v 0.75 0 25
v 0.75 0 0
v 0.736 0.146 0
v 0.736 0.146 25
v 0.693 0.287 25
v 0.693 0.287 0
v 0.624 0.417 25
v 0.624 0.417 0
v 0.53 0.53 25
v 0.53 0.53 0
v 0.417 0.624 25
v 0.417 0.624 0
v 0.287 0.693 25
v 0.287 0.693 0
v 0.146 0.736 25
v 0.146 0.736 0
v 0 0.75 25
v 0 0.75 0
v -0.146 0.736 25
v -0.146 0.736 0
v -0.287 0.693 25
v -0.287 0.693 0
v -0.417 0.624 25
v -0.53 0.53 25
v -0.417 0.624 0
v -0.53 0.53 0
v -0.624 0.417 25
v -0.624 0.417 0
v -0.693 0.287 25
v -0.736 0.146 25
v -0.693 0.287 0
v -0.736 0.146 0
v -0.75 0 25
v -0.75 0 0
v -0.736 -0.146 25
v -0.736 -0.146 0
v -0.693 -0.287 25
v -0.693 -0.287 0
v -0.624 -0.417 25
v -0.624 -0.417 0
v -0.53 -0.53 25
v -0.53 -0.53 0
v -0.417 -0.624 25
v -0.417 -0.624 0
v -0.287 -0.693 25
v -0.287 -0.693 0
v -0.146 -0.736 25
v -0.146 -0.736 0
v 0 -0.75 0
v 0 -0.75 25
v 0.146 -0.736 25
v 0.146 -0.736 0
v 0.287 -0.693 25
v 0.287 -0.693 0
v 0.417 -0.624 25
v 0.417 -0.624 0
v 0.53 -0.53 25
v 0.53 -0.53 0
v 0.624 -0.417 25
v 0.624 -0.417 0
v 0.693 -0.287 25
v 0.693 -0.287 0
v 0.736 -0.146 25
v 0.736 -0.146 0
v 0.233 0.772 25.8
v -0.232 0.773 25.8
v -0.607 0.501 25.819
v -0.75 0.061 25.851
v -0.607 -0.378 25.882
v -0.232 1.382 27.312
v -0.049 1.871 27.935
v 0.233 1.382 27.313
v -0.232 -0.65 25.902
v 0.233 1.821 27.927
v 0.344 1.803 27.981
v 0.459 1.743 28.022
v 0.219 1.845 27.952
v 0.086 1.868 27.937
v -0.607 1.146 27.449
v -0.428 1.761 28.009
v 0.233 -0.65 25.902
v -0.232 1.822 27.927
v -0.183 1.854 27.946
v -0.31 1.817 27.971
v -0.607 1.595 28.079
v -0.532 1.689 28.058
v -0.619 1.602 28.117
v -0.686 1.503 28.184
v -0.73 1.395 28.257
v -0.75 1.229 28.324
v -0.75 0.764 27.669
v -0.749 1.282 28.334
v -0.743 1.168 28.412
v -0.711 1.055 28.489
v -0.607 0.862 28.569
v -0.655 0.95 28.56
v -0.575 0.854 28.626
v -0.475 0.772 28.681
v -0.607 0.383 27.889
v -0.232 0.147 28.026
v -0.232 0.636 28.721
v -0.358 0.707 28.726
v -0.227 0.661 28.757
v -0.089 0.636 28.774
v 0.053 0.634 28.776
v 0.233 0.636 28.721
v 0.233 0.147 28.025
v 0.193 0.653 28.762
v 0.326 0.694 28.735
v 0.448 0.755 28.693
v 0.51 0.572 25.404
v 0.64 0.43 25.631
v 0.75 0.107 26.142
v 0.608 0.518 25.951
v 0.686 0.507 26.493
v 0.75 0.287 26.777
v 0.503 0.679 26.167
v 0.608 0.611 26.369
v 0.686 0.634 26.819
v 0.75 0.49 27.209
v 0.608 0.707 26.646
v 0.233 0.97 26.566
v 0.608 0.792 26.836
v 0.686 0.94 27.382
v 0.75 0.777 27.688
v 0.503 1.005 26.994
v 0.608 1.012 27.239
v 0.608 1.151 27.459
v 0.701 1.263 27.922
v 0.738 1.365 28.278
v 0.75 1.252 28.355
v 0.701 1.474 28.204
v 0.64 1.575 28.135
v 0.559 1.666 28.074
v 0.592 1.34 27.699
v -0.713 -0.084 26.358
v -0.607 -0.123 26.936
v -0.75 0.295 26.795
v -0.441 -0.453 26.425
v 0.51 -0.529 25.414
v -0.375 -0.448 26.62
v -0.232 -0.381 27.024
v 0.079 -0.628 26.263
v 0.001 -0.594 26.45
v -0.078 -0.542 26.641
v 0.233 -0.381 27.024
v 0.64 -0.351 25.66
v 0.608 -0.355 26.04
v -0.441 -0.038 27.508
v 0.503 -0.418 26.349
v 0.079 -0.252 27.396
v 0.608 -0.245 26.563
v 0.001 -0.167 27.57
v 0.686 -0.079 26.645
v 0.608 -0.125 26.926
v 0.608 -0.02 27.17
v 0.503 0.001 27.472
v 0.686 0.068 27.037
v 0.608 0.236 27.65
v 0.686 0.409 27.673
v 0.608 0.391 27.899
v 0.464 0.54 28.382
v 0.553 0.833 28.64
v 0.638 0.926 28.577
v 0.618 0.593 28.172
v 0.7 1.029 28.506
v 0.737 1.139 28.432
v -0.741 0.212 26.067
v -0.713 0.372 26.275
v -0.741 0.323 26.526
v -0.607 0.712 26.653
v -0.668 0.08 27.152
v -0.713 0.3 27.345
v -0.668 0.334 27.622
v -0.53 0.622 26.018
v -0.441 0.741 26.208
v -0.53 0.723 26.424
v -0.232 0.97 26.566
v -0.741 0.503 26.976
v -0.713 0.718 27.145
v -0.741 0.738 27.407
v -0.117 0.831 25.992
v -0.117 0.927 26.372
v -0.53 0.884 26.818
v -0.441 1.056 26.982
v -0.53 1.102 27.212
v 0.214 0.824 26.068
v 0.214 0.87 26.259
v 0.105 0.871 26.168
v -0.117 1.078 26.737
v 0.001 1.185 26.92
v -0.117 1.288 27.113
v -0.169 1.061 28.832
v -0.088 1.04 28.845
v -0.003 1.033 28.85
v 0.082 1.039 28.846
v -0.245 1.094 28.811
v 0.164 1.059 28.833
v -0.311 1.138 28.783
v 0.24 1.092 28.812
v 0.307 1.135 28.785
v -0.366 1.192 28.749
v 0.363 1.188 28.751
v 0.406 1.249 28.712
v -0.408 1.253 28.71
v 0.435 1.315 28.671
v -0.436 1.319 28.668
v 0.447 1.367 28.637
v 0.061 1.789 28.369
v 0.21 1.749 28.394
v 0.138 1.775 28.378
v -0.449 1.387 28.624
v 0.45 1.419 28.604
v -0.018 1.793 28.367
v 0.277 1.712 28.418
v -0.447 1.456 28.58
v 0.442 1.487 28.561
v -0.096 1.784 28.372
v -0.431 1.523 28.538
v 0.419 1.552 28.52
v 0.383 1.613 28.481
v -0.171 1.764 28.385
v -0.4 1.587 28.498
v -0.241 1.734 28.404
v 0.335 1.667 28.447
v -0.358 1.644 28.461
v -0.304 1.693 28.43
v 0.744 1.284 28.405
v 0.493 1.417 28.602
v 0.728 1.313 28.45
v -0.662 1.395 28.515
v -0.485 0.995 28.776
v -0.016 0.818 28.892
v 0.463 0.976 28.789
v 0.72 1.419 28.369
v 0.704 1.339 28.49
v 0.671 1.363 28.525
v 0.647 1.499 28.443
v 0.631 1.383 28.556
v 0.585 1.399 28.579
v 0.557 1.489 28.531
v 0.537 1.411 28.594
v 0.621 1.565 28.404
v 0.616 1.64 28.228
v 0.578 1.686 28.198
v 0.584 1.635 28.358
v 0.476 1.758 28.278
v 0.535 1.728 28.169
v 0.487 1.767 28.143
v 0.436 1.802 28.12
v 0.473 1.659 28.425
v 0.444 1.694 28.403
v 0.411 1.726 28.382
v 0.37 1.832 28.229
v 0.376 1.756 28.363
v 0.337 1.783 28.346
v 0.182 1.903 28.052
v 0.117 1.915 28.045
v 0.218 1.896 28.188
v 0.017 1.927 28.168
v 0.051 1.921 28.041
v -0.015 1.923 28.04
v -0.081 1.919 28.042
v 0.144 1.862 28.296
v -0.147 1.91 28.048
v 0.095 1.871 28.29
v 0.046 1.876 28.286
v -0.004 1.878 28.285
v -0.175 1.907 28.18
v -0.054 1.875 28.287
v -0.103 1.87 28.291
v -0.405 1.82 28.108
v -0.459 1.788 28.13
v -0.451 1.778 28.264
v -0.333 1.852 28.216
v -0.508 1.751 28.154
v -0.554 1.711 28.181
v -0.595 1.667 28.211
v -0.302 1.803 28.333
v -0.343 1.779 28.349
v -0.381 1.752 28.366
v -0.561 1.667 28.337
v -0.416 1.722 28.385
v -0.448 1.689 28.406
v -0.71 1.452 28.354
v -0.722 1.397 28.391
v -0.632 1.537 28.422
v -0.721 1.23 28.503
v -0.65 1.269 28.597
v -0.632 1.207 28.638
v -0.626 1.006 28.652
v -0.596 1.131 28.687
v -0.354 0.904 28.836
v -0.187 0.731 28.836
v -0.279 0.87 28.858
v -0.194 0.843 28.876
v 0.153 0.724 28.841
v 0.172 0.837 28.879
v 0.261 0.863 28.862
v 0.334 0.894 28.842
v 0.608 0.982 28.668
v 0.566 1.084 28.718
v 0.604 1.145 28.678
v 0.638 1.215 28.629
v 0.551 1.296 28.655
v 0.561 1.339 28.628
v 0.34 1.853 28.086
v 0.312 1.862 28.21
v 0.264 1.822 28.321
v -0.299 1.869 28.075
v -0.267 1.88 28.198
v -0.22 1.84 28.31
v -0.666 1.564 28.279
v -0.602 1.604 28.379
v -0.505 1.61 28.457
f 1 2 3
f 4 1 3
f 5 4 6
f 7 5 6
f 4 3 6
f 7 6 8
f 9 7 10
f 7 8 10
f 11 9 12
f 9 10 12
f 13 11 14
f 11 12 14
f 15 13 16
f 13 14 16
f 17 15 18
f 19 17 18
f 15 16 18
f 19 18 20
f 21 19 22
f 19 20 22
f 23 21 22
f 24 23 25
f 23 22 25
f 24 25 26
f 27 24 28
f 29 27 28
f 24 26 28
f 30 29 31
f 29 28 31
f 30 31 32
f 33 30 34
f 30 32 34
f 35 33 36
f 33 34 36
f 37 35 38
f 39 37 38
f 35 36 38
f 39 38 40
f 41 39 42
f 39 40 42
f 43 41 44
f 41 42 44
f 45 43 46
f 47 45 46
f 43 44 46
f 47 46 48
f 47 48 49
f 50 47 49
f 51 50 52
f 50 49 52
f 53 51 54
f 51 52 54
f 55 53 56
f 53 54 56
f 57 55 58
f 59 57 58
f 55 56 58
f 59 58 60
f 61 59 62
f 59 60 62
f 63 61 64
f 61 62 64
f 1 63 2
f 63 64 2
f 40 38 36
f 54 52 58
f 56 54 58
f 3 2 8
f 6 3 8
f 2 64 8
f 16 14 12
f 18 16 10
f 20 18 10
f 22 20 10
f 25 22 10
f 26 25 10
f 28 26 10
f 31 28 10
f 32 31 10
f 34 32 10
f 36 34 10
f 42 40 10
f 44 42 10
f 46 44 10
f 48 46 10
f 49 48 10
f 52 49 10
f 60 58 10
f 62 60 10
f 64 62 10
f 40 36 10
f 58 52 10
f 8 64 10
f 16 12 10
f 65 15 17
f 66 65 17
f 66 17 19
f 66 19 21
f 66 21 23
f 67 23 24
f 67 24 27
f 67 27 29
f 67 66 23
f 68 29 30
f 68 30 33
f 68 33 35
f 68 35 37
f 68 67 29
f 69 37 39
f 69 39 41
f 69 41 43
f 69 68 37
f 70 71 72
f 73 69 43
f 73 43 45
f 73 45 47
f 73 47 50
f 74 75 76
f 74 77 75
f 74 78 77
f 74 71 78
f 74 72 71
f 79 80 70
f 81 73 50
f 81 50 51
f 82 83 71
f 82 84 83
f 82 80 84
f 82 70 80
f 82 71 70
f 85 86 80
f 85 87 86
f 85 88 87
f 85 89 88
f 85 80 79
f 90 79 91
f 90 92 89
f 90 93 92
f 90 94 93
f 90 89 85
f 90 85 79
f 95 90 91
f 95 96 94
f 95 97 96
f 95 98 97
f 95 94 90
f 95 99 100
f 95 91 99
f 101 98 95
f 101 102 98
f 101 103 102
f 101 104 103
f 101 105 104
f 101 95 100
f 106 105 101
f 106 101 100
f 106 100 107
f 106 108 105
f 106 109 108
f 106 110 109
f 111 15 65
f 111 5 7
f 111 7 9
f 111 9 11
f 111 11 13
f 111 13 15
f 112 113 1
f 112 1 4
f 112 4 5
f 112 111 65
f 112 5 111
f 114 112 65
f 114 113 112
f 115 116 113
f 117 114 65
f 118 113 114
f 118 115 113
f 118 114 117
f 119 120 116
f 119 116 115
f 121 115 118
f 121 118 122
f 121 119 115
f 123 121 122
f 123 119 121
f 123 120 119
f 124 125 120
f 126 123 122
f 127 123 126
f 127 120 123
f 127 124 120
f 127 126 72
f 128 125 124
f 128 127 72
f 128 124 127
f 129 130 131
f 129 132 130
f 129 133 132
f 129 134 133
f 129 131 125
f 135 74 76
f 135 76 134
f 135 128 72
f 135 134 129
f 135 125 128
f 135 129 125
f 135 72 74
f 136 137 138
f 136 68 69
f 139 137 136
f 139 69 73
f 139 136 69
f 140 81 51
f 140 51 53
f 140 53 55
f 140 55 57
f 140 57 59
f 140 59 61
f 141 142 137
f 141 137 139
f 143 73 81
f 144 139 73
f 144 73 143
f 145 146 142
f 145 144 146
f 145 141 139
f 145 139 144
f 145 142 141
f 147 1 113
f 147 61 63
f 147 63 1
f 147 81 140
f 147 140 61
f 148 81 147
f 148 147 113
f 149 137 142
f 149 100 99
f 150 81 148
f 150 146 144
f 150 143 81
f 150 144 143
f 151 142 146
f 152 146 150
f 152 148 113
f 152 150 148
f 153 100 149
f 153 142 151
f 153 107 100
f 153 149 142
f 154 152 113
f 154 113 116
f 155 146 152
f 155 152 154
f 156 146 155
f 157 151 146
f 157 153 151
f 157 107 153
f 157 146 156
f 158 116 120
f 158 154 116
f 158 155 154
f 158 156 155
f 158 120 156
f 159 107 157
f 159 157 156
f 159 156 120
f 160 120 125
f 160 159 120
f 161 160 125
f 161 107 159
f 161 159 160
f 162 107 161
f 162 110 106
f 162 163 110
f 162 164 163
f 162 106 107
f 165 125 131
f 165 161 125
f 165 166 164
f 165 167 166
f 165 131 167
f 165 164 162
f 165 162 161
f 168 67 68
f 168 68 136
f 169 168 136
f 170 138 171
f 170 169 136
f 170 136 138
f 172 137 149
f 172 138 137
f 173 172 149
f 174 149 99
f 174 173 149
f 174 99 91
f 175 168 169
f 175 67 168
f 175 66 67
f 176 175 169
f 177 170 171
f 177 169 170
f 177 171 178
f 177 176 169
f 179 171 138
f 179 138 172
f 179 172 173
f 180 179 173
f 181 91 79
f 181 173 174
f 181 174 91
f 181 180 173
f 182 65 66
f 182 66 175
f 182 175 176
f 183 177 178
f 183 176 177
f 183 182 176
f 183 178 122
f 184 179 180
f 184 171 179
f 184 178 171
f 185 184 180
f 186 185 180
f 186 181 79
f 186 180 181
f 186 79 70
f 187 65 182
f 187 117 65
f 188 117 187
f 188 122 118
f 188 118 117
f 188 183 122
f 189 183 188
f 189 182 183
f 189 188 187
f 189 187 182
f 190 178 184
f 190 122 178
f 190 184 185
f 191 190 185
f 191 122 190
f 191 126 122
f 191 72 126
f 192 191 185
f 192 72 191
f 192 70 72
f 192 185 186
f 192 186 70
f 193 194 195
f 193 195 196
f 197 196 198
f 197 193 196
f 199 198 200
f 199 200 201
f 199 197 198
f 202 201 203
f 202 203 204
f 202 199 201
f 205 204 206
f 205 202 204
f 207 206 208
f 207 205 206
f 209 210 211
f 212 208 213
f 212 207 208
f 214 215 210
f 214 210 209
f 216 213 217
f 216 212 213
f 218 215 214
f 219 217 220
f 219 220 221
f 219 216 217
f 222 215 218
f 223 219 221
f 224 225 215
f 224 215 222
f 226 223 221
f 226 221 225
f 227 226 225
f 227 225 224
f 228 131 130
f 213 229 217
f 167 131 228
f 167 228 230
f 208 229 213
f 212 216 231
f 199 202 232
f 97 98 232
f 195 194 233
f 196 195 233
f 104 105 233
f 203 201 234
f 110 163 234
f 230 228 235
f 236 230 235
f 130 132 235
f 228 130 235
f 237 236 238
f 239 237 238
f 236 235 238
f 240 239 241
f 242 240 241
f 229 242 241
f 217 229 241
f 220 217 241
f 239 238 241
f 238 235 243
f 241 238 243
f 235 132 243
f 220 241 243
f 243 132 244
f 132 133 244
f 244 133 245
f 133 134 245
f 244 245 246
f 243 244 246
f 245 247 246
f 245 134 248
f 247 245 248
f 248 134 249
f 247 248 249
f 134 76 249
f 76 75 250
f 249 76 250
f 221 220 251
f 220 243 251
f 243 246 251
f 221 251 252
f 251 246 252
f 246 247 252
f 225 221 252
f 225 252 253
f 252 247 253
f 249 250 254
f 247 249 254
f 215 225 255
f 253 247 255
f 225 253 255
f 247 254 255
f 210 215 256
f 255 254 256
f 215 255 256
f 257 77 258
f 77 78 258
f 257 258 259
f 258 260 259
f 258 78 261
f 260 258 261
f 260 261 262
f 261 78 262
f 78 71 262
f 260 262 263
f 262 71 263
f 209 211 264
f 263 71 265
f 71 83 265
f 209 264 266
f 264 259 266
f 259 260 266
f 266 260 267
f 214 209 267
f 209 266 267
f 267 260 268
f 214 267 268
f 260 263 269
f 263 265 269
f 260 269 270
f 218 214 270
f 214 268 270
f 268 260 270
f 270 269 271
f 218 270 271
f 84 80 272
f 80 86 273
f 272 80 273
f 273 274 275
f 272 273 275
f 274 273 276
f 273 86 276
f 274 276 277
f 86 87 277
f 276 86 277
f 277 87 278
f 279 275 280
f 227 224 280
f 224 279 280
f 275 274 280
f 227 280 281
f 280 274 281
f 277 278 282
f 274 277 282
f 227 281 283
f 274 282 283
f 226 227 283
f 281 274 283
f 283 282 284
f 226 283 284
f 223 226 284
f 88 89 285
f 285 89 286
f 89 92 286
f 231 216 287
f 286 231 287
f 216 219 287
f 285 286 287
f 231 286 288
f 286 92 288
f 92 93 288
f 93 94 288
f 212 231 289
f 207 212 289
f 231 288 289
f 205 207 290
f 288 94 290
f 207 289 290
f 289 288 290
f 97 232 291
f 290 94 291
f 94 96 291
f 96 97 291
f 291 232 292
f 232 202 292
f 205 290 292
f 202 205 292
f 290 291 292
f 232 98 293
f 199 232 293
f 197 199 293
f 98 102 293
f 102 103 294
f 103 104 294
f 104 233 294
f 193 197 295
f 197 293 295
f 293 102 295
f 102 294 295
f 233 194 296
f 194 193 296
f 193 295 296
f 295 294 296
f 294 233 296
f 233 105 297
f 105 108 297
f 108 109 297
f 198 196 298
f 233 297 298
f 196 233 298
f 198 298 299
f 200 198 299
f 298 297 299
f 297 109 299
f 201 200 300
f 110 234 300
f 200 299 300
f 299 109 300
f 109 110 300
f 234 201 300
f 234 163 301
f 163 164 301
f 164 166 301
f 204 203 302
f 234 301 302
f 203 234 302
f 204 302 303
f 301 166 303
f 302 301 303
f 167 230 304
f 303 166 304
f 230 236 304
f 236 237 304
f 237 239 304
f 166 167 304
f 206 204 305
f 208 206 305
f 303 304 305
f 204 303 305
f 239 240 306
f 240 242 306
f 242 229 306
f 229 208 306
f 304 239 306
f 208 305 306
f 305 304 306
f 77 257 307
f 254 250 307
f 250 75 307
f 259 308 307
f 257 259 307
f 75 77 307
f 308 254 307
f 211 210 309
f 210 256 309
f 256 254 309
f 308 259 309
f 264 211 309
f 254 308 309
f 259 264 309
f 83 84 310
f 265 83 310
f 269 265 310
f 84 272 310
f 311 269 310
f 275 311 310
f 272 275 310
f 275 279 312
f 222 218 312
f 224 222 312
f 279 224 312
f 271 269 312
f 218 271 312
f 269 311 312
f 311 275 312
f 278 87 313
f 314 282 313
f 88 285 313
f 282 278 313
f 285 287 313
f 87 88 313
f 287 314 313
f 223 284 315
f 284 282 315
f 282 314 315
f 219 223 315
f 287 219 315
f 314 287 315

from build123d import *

# Parameters (mm, degrees)
F0_R     = 0.75
F1_DEPTH = 25
F5_R     = 0.75
F7_R     = 0.3


with BuildPart() as f1:
    # F0 (on Top) → F1 (new body)
    with BuildSketch(Plane.XY):
        Circle(F0_R)
    extrude(amount=F1_DEPTH)

    # F6: sweep along a path in F4
    with BuildLine(Plane.YZ) as f6_path:
        add(Plane.YZ * Edge.make_bspline(
            [(0, 25), (0.0276527047, 25.5188264102), (0.048108405, 26.7957580563), (1.2597410469, 28.3543405458), (1.3940753419, 28.5497736832), (1.4285740908, 28.5981334746)],
            knots=[0, 0, 0, 0, 0.4186868784, 0.8442205829, 1, 1, 1, 1], degree=3))
    # F5 (on offset) → F6 (sweep)
    with BuildSketch(Plane.XY.offset(25)):
        Circle(F5_R)
    sweep(path=f6_path.line)

    # F7
    f7_edges = [f1.edges().sort_by_distance(p)[0] for p in [
        (-0.75, 1.428574, 28.598133),
    ]]
    fillet(f7_edges, radius=F7_R)


solid = f1.part
